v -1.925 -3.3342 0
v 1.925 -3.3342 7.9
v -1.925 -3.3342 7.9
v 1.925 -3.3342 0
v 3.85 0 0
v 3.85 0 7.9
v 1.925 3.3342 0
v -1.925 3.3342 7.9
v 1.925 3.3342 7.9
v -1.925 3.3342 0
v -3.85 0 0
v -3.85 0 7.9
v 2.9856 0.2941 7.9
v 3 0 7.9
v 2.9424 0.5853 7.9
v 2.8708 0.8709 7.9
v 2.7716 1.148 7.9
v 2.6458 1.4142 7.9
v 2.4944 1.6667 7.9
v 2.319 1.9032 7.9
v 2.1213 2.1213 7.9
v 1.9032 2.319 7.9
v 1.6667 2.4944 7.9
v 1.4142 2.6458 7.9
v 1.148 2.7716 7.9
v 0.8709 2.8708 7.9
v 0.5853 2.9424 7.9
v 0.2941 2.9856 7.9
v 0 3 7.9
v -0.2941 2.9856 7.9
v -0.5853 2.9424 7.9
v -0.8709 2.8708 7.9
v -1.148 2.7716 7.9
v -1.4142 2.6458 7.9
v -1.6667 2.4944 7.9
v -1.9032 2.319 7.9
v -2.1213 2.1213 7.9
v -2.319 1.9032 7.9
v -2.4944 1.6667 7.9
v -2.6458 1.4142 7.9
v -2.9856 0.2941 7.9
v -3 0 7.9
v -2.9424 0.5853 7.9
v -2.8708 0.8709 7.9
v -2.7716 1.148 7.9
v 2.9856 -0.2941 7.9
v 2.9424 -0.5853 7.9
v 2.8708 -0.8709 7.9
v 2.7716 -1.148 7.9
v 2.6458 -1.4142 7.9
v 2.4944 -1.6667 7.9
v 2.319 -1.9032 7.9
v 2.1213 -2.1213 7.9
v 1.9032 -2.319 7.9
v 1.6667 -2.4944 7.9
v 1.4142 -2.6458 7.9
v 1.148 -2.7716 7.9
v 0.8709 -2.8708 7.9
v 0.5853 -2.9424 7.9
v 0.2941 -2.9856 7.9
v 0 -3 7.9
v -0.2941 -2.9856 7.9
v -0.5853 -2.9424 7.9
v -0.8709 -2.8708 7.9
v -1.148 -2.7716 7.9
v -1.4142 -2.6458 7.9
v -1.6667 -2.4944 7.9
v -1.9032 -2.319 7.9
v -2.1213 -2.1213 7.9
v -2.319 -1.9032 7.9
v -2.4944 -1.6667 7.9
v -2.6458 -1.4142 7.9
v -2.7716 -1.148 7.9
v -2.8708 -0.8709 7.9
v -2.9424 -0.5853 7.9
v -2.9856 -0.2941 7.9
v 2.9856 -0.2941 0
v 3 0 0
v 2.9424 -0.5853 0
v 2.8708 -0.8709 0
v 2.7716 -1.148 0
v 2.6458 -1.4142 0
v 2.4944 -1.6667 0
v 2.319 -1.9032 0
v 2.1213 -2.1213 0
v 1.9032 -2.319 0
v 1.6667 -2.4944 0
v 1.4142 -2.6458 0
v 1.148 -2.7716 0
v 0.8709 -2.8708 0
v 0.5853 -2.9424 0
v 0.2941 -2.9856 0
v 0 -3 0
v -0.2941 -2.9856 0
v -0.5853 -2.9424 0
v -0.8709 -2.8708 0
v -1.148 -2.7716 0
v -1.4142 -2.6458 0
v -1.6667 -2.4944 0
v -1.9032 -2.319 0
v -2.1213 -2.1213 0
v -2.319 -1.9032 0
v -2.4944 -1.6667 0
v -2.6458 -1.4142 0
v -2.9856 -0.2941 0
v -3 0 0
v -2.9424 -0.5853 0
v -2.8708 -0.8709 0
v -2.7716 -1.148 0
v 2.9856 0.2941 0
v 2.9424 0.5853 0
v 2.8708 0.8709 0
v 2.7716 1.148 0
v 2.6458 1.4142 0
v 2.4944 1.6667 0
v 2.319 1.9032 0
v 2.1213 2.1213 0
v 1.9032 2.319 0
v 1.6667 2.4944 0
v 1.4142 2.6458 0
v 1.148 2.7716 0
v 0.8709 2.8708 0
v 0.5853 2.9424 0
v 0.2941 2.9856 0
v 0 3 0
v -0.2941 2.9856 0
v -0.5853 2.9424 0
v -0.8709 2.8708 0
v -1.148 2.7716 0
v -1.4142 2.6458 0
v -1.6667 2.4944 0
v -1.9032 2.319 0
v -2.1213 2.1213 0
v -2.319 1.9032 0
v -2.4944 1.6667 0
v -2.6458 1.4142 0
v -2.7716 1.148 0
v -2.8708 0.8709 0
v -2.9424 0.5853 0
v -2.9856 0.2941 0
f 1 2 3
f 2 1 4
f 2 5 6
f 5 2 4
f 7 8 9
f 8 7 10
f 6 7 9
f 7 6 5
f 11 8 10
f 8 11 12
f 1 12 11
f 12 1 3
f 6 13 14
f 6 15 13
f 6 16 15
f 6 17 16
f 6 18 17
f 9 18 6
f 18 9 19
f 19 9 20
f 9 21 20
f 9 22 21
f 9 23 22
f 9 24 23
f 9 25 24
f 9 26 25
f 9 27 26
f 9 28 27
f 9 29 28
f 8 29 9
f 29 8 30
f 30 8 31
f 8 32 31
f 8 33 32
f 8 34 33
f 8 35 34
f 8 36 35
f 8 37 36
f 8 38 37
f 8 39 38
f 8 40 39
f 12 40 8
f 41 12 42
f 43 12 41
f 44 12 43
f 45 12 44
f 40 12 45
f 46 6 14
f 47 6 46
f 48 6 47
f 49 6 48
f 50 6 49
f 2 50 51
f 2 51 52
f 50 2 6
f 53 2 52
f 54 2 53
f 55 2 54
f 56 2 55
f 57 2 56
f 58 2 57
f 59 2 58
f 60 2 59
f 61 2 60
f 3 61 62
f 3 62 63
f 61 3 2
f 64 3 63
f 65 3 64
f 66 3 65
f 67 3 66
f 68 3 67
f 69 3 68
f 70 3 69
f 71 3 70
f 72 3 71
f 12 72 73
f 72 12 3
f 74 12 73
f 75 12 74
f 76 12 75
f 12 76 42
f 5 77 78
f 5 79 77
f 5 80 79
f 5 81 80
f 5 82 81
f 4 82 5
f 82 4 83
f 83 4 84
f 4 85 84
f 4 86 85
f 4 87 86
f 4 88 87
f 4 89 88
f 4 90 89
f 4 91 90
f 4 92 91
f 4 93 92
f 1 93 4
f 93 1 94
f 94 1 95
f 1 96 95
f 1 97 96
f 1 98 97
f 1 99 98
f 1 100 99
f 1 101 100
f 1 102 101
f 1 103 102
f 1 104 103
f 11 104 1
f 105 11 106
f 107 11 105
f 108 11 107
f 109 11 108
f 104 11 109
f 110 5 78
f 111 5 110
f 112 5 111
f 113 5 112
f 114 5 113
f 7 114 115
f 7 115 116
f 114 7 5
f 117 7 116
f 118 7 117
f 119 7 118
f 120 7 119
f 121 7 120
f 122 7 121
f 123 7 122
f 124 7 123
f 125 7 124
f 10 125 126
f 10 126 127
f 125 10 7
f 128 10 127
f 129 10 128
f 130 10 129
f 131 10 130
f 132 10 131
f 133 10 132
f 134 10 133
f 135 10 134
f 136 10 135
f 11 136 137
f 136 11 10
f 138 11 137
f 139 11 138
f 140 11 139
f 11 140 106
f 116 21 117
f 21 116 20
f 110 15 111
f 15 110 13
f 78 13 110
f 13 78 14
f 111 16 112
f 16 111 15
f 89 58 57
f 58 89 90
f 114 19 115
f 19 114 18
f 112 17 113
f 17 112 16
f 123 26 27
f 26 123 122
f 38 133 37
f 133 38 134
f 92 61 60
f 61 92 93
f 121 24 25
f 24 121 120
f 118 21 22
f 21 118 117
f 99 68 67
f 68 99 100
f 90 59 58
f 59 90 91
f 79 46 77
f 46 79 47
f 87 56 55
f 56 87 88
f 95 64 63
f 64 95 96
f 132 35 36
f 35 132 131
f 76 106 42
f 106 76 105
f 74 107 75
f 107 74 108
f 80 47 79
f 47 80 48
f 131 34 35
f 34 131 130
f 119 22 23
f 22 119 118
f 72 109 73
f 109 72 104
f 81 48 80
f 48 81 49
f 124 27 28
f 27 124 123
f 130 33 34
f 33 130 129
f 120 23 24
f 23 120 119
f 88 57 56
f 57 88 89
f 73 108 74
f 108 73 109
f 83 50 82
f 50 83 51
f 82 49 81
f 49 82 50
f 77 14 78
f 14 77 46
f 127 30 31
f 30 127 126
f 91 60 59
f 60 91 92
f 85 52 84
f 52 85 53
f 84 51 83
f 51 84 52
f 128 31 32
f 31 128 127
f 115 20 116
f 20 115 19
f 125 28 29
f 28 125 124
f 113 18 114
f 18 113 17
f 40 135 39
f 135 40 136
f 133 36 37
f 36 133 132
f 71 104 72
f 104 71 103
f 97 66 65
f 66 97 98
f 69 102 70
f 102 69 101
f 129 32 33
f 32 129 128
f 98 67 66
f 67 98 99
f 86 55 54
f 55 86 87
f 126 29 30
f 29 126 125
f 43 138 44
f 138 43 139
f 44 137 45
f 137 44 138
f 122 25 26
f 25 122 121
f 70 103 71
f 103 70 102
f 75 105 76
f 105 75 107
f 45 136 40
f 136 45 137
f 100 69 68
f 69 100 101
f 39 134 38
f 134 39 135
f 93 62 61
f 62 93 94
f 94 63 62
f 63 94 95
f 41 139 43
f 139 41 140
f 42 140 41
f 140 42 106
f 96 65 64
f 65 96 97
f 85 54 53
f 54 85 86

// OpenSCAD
module hex_nut() {
    difference() {
        // Hexagonal prism for the nut
        scale([1, 1, 7.9/2]) 
            cylinder(d=7.7, h=2, $fn=6);
        
        // Cylindrical hole for the screw
        translate([0, 0, -10])
            cylinder(d=6, h=20, $fn=64);
    }
}

hex_nut();
